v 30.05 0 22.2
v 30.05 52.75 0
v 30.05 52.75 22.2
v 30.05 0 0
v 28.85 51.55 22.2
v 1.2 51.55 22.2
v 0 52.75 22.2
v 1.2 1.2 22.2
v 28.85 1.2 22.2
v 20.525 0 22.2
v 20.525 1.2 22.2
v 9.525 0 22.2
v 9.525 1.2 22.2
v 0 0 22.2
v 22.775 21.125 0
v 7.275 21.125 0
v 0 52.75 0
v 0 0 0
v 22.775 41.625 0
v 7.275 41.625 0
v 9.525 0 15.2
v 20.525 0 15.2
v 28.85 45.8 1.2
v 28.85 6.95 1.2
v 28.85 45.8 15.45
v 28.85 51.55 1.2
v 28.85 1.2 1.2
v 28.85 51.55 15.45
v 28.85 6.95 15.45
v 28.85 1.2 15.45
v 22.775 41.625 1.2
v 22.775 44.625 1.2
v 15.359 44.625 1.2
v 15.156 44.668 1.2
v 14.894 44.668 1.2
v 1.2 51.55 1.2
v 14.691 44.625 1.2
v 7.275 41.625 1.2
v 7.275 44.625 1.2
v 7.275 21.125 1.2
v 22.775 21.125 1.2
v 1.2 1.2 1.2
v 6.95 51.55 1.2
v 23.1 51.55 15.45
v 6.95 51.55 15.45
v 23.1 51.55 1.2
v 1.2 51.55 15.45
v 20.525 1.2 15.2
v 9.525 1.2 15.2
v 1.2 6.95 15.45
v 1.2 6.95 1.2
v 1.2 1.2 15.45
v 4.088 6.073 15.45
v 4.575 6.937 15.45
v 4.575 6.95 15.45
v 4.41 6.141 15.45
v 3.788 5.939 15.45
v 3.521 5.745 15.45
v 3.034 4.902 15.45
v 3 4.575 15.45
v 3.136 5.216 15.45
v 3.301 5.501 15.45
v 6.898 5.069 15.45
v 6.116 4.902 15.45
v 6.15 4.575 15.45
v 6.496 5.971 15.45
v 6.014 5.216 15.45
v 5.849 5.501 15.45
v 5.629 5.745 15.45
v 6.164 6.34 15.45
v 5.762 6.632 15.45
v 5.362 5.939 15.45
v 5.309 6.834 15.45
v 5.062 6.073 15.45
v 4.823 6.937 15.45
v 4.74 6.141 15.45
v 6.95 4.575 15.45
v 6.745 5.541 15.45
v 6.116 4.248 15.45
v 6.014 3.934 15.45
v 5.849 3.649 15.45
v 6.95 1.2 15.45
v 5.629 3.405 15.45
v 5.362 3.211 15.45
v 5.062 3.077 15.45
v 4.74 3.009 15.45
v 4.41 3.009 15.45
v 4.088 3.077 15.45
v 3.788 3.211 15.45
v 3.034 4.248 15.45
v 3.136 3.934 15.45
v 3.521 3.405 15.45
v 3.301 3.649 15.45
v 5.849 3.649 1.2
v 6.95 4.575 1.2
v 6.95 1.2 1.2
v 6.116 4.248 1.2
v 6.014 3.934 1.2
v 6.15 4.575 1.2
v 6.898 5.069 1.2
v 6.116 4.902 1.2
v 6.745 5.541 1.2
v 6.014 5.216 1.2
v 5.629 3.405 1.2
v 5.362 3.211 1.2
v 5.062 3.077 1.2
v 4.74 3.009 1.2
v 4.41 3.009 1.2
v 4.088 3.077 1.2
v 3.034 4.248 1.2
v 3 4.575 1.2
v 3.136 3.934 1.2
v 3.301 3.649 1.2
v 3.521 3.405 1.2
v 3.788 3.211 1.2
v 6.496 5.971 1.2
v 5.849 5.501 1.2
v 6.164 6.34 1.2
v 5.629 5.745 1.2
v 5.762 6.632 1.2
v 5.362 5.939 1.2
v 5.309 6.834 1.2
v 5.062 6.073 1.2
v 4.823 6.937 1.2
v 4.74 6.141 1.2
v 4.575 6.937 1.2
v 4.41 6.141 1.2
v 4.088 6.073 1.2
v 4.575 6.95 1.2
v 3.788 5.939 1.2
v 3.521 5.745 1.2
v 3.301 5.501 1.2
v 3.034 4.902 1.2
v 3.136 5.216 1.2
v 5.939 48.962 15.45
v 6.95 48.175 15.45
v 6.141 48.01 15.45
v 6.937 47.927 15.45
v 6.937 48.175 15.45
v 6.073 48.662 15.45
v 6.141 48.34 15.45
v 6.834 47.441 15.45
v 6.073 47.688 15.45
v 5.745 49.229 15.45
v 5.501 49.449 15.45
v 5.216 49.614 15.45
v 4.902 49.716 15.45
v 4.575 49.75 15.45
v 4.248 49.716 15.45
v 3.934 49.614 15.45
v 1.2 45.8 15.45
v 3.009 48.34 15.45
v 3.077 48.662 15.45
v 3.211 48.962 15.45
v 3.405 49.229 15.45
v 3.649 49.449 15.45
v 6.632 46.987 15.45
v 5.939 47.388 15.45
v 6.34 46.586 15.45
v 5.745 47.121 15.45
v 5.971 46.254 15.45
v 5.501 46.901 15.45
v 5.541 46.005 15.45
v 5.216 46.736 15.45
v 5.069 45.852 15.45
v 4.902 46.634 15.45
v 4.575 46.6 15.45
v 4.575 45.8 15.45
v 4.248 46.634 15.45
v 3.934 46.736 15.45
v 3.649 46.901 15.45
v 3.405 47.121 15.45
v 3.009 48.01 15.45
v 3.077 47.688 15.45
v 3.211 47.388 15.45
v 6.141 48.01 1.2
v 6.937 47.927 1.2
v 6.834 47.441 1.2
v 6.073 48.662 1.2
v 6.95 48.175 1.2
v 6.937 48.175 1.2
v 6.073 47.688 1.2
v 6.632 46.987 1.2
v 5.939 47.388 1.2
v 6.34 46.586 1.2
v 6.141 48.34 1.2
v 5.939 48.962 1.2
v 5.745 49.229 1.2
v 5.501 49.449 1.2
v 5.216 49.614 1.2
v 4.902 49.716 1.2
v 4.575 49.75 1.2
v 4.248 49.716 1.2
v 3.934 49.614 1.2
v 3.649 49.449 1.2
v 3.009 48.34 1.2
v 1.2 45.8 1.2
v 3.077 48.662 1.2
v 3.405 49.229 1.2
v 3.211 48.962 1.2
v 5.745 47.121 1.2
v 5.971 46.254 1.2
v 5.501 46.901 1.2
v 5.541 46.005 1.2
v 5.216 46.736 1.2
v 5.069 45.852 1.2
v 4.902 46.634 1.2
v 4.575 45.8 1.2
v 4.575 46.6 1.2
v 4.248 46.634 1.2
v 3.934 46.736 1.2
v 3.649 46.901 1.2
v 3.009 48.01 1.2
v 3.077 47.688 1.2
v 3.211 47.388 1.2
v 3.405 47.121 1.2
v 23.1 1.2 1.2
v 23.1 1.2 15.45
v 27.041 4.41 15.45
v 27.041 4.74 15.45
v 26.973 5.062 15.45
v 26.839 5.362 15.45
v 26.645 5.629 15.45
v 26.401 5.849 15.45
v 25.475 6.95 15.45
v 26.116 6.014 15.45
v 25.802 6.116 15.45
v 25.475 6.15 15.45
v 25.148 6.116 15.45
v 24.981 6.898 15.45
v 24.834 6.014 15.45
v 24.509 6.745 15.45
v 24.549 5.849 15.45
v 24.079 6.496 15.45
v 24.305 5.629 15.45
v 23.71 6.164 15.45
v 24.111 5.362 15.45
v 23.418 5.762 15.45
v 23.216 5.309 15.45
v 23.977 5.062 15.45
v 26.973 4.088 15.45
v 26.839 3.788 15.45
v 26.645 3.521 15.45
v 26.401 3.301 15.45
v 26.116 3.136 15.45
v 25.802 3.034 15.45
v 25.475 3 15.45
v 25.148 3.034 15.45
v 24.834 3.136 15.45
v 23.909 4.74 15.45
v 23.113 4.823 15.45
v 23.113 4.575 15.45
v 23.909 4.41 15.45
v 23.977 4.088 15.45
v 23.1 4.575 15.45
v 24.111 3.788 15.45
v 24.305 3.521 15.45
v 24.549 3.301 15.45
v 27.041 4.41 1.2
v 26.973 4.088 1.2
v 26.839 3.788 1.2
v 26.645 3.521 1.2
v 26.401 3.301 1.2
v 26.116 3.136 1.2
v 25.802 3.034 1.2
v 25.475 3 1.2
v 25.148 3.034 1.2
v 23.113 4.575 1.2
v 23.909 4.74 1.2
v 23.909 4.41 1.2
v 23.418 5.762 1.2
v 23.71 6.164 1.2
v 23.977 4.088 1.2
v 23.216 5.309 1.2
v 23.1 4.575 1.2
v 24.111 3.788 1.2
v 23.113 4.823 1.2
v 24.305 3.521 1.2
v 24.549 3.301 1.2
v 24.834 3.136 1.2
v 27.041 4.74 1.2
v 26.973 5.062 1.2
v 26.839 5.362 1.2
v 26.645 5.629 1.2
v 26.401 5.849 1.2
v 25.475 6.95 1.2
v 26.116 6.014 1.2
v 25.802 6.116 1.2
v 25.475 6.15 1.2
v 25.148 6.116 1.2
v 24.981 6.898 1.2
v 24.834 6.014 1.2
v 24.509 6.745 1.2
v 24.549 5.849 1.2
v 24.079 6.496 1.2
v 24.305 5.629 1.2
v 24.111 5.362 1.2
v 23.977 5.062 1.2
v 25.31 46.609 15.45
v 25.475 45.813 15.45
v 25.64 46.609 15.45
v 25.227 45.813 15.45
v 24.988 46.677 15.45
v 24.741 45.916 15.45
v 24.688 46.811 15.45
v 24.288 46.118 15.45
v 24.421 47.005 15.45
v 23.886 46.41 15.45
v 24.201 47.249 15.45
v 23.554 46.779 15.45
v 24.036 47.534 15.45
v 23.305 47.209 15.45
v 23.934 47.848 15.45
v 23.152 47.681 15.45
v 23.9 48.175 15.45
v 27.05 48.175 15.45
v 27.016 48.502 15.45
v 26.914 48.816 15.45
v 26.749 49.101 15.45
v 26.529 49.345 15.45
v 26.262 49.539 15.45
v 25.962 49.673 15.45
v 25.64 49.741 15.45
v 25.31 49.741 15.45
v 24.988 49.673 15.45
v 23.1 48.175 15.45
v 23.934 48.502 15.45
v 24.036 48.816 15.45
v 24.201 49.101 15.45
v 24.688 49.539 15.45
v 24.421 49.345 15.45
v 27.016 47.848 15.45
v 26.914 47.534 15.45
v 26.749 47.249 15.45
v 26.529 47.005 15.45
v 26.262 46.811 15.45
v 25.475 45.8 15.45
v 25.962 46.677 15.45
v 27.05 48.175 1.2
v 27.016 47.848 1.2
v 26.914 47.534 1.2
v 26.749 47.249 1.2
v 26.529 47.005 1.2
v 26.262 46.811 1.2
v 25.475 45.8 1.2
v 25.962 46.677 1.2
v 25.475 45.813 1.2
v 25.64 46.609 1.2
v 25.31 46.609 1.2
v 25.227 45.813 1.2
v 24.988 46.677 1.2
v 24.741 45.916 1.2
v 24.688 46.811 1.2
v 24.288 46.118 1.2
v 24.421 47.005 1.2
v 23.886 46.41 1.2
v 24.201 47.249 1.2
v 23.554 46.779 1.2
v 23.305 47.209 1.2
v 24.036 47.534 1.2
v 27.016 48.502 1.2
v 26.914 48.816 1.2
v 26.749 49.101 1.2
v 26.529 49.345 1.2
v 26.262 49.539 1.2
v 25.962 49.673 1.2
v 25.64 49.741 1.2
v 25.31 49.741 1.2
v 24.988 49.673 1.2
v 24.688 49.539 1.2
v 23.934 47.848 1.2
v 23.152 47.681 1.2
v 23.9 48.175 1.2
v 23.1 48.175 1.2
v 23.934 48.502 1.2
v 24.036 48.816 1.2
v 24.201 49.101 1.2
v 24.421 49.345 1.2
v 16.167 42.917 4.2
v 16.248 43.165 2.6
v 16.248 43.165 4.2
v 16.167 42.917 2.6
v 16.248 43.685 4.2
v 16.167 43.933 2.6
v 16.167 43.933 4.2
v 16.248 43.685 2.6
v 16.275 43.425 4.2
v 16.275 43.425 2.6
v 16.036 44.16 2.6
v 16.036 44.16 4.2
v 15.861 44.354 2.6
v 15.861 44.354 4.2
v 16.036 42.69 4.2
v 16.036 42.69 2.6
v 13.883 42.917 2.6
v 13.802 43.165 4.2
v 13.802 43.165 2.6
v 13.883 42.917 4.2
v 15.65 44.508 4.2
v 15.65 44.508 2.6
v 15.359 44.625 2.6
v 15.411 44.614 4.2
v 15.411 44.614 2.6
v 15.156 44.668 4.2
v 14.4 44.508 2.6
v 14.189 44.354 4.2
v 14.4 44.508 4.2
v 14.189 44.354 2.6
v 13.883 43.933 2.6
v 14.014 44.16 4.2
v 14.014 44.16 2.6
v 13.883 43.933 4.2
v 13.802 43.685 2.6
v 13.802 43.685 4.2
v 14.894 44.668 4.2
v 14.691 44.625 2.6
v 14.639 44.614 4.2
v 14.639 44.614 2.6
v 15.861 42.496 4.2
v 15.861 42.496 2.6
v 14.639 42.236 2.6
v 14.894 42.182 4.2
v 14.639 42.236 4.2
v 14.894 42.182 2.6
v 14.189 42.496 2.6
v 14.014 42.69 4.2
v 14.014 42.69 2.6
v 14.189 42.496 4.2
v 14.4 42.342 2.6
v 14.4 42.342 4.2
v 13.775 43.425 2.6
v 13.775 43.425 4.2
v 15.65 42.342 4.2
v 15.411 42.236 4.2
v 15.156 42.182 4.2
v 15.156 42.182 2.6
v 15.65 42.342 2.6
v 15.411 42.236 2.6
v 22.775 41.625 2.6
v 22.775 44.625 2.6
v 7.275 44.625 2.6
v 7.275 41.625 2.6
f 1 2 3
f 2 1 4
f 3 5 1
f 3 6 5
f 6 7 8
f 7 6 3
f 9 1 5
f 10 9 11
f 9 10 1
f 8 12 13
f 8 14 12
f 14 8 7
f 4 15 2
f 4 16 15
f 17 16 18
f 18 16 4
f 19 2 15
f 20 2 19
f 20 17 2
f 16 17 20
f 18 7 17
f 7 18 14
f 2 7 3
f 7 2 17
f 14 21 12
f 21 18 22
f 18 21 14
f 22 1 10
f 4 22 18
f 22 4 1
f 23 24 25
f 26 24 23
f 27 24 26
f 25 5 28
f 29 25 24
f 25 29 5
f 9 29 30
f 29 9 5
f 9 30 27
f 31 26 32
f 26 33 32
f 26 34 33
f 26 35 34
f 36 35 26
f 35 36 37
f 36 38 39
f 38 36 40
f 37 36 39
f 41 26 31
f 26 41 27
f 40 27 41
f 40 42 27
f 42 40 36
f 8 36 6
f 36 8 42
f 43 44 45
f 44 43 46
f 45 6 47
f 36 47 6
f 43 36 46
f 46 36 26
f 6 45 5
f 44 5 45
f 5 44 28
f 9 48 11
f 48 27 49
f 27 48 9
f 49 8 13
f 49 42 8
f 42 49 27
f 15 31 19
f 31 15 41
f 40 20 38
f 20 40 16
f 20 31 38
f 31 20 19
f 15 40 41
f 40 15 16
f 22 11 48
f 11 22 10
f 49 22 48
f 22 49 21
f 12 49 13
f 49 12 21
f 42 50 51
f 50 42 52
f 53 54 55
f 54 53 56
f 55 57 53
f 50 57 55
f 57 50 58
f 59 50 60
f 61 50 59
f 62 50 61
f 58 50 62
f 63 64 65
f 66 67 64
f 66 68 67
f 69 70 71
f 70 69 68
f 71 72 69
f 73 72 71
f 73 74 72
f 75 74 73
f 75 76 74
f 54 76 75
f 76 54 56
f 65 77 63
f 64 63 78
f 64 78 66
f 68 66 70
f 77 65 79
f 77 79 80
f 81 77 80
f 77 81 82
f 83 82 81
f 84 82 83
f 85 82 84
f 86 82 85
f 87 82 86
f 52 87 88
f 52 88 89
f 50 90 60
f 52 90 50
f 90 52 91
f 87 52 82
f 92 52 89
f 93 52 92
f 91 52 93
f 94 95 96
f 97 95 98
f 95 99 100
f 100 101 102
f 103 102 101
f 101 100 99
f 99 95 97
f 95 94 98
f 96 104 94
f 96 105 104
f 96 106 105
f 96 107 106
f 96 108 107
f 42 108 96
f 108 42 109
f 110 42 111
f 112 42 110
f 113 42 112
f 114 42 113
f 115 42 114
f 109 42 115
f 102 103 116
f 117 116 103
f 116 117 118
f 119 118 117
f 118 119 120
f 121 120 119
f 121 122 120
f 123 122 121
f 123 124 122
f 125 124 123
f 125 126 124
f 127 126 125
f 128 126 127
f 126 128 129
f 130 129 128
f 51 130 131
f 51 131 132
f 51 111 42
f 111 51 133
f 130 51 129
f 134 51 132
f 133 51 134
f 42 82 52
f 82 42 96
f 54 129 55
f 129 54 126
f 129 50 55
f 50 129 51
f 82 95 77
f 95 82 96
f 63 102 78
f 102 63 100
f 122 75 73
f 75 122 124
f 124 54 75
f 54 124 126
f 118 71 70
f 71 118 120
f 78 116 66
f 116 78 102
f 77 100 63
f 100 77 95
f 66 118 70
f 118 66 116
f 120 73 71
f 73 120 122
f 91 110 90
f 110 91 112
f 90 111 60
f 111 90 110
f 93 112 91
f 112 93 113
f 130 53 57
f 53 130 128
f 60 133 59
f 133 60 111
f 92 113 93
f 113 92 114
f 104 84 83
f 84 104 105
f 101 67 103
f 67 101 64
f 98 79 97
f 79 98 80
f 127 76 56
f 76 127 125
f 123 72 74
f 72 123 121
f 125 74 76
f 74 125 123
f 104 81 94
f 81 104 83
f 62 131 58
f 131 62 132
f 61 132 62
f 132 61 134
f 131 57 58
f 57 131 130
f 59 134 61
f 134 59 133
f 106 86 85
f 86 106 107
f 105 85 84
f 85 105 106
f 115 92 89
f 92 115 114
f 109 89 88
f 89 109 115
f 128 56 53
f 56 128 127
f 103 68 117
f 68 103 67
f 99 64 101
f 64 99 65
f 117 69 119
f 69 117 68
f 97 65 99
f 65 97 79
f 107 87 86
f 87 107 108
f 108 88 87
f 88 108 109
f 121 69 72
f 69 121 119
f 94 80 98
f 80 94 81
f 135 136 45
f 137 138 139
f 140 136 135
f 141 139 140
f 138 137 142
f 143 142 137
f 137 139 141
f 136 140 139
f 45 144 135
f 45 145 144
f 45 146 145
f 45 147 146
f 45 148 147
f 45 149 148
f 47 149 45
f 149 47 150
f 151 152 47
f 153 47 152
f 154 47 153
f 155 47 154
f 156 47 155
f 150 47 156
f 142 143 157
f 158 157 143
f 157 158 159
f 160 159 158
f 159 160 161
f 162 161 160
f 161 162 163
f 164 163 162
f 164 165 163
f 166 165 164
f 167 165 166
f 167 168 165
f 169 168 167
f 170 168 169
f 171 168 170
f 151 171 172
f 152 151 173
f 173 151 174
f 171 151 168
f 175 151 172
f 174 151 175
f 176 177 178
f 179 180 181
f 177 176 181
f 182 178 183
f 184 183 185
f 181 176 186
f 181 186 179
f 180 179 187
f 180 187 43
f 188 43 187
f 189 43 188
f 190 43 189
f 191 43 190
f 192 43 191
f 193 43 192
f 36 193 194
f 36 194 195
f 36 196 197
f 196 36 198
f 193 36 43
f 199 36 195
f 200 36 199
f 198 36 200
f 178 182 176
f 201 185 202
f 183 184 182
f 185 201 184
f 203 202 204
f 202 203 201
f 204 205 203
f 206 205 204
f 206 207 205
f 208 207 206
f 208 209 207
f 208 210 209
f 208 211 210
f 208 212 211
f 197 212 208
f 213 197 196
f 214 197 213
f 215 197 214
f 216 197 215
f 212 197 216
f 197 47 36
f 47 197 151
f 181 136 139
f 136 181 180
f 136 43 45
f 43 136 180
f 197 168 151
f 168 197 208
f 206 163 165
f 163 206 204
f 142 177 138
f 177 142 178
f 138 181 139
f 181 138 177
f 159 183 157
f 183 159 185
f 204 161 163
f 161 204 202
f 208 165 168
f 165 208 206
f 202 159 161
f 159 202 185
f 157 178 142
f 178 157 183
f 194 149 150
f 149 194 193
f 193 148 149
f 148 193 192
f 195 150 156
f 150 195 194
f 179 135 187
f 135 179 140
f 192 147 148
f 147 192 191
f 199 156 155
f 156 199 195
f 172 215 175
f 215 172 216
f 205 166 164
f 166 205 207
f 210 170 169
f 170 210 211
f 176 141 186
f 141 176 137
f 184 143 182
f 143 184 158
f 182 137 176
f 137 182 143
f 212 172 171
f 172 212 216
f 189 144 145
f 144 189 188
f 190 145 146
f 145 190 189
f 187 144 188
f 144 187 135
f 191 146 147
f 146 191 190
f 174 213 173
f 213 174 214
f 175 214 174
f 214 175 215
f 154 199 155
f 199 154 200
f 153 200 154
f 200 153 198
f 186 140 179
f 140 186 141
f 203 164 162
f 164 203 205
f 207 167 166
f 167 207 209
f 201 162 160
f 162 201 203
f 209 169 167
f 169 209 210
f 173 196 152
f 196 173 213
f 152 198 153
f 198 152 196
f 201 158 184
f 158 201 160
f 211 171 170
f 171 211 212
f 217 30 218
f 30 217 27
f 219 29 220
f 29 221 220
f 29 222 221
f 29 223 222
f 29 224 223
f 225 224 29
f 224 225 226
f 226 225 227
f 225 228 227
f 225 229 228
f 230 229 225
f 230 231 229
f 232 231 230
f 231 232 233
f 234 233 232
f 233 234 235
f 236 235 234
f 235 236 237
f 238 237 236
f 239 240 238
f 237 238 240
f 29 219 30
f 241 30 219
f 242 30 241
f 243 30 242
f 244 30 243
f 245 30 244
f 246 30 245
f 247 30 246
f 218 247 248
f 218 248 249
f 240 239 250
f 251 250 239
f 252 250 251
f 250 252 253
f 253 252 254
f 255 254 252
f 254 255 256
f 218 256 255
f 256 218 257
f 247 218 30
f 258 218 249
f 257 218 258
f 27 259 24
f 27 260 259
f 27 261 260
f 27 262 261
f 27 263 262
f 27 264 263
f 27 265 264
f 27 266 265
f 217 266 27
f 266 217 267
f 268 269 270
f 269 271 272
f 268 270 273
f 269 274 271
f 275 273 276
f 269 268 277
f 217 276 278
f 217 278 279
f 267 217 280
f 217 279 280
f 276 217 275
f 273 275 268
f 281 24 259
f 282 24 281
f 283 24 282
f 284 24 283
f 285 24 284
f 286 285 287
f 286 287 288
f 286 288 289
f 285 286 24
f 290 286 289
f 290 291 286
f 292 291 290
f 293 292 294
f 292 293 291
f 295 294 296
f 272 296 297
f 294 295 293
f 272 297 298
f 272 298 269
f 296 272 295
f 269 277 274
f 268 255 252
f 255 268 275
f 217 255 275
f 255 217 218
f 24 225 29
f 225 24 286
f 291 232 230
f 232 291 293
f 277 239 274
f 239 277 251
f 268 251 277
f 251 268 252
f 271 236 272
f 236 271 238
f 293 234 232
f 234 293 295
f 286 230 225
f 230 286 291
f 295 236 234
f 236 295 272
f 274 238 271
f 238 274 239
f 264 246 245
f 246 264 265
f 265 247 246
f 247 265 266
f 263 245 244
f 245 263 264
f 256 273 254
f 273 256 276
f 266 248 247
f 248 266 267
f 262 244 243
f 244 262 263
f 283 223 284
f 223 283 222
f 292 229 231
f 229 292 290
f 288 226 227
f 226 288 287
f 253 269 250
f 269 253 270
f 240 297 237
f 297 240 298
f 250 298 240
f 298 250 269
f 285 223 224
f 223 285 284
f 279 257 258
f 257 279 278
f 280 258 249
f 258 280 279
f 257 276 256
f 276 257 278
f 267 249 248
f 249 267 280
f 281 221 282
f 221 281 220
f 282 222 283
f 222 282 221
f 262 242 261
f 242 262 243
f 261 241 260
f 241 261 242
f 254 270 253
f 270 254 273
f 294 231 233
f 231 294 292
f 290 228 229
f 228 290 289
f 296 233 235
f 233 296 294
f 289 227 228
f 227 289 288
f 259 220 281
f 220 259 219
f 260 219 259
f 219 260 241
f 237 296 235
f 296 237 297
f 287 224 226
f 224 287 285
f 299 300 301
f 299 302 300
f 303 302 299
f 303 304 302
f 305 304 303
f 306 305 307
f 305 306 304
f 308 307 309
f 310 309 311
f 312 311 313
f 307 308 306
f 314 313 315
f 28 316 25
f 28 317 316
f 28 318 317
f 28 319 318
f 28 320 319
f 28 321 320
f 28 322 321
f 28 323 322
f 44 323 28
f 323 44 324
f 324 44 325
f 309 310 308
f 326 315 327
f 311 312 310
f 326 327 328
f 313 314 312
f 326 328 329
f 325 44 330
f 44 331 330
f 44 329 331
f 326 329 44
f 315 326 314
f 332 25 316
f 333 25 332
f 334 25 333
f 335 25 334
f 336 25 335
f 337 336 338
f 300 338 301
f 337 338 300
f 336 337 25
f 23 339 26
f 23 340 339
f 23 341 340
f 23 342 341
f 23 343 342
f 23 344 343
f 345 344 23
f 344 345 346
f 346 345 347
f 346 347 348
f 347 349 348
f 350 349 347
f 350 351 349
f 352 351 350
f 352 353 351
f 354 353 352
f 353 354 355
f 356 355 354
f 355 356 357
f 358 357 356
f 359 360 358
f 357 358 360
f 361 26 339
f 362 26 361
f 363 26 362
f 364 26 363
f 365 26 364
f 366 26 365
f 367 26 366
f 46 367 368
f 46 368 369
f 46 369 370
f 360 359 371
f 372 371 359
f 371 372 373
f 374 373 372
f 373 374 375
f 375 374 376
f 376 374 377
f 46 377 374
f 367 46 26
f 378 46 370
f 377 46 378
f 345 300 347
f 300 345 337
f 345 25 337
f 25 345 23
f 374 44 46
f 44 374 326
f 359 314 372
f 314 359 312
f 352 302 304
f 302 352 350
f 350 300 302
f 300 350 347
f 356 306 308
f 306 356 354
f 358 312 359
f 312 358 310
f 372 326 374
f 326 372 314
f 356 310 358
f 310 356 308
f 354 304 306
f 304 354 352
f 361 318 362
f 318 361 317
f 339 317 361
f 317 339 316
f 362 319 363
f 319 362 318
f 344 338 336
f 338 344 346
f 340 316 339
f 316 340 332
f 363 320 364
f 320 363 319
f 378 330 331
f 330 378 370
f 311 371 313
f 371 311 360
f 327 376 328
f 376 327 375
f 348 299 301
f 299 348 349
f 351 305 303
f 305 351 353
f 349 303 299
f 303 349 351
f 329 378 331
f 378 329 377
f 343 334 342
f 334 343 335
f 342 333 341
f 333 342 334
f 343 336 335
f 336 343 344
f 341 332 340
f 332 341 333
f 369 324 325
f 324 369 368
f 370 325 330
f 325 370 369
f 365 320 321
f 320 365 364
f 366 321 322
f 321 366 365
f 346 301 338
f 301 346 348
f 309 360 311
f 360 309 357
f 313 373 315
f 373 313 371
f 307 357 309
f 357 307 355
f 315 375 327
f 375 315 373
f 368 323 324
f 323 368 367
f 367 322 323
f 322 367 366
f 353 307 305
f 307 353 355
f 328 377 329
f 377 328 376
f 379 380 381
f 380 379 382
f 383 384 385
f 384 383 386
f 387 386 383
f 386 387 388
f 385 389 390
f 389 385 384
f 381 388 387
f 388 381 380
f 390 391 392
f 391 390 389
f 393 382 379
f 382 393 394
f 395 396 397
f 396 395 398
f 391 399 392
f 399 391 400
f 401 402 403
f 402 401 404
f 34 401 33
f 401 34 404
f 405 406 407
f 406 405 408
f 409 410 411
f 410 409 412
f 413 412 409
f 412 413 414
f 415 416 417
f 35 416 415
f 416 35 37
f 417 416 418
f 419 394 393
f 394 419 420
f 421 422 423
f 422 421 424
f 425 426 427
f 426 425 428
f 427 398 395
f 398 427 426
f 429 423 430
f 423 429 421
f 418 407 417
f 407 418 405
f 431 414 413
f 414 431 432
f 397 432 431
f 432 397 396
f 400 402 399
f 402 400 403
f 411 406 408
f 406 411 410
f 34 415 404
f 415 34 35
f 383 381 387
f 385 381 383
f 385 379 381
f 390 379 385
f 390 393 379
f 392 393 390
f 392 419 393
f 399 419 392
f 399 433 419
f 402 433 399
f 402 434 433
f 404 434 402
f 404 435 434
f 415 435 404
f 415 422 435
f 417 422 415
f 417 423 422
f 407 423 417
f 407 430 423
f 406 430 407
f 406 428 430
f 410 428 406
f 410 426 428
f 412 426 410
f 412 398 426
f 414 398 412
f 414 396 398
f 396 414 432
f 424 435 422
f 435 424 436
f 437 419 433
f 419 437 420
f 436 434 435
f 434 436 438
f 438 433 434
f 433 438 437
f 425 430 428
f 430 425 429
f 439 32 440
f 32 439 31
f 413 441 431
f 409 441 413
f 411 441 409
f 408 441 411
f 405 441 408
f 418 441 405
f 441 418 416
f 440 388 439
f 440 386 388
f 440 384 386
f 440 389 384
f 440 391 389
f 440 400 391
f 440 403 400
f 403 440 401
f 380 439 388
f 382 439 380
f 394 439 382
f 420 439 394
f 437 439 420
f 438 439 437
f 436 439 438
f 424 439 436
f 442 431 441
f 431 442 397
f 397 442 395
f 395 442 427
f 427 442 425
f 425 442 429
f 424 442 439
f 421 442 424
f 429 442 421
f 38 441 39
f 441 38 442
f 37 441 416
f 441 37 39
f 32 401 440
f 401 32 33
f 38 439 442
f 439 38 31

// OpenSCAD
//------------------------------------------------
// 1 - body of the NodeMCU + DHT22 box
//
// author: Alessandro Paganelli 
// e-mail: alessandro.paganelli@gmail.com
// github: https://github.com/allep
// license: GPL-3.0-or-later
// 
// Description
// This case is designed to be used with a NodeMCU 
// Amica ESP-8266 board and a DHT22 temperature
// and humidity sensor.
//
// All sizes are expressed in mm.
//------------------------------------------------

// Set face number to a sufficiently high number.
$fn = 30;

//------------------------------------------------
// Debug mode
// Set DEBUG_MODE to 1 to simulate the actual 
// screw positions, to validate the design.
DEBUG_MODE = 0;

//------------------------------------------------
// Variables

//------------------------------------------------
// Pockets
// Let's increase a little bit pocket sizs in order 
// to allow for easier simulation.
POCKET_TOLERANCE = 0.1;

//------------------------------------------------
// Box

// Inner sizes: outer size will be increased by
// the wall thickness.
Z_LEN = 21;

WALL_THICKNESS = 1.2;
BASE_THICKNESS = 1.2;

CYLINDER_THICKNESS = 0.8;

// For M3 screws it must be 1.5 mm + 5% tolerance
CYLINDER_RADIUS = 1.575;

// tolerances
CYLINDER_GAP = 1.0;

//------------------------------------------------
// Board size
BOARD_THICKNESS = 2.0;
BOARD_HEIGHT = 6.75; // including clearence

// Based on NodeMCU Amica ESP-8266 board.
SCREW_DISTANCE_Y = 43.6;
SCREW_DISTANCE_X = 20.9;

// Usb size
// Note: to be quite sure that any USB cable can fit
// here we create a hole quite large (height > 
// BOARD_HEIGHT)
// Adjust it based on your needs.
Z_USB_PORT_HEIGHT = 7;
X_USB_PORT_LEN = 11;

//------------------------------------------------
// DHT22

X_SENSOR_LEN = 15;
Y_SENSOR_LEN = 20;
X_SENSOR_GAP = 0.25;
Y_SENSOR_GAP = 0.25;

// Used to keep track of the pins that need some
// clearance to allow cables to be connected.
Y_SENSOR_DISPLACEMENT = 5;

// Peg
SENSOR_PEG_RADIUS = 1.25;
Y_SENSOR_PEG_DISTANCE = 1.8;
Z_SENSOR_PEG_HEIGHT = 3.0;
Y_SENSOR_STEP_LEN = 3;
Z_SENSOR_STEP_HEIGHT = 1.4;

//------------------------------------------------
// Screw sizes (M3)

SCREW_RADIUS = 1.5;
Z_SCREW_LEN = 30; // used just for simulation
Z_SCREW_HEAD_LEN = 4.0;

//------------------------------------------------
// Modules

module corner(radius, height, thickness, gap, position, plane_rotation) {
    ext_r = radius + thickness;
    
    translate(position)
    rotate([0, 0, plane_rotation])
    difference() {
        union() {
            cube([ext_r + gap, ext_r + gap, height]);
            translate([0, - ext_r, 0])
            cube([ext_r + gap, ext_r, height]);
            translate([- ext_r, 0, 0])
            cube([ext_r, ext_r + gap, height]);
            cylinder(h = height, r = ext_r);
        }
        cylinder(h = height + POCKET_TOLERANCE, r = radius);
    }
}

//------------------------------------------------
// Actual script

// First compute sizes

x_len_inner = SCREW_DISTANCE_X + 2*(CYLINDER_RADIUS + CYLINDER_THICKNESS + CYLINDER_GAP);
y_len_inner = SCREW_DISTANCE_Y + 2*(CYLINDER_RADIUS + CYLINDER_THICKNESS + CYLINDER_GAP);
x_len_outer = x_len_inner + 2*WALL_THICKNESS;
y_len_outer = y_len_inner + 2*WALL_THICKNESS;

echo("Computed X len = ", x_len_outer, " and Y len = ", y_len_outer);

// actual box
difference() {
    // the box
    difference() {
        cube([x_len_outer, y_len_outer, Z_LEN + BASE_THICKNESS]);
        translate([WALL_THICKNESS, WALL_THICKNESS, BASE_THICKNESS])
        cube([x_len_inner, y_len_inner, Z_LEN + POCKET_TOLERANCE]);
    }
    // the sensor hole
    translate([x_len_outer/2 - X_SENSOR_LEN/2 - X_SENSOR_GAP, y_len_outer/2 - Y_SENSOR_LEN/2 - Y_SENSOR_GAP + Y_SENSOR_DISPLACEMENT, -POCKET_TOLERANCE])
    cube([X_SENSOR_LEN + 2*X_SENSOR_GAP, Y_SENSOR_LEN + 2*Y_SENSOR_GAP, BASE_THICKNESS + 2*POCKET_TOLERANCE]);
    // the usb port hole
    translate([x_len_outer/2 - X_USB_PORT_LEN/2, -POCKET_TOLERANCE, Z_LEN + BASE_THICKNESS - Z_USB_PORT_HEIGHT])
    cube([X_USB_PORT_LEN, WALL_THICKNESS + 2*POCKET_TOLERANCE, Z_USB_PORT_HEIGHT + POCKET_TOLERANCE]);
}

// screw holes
shift_x1 = CYLINDER_GAP + CYLINDER_THICKNESS + CYLINDER_RADIUS + WALL_THICKNESS;
shift_y1 = CYLINDER_GAP + CYLINDER_THICKNESS + CYLINDER_RADIUS + WALL_THICKNESS;
corner(CYLINDER_RADIUS, Z_LEN-BOARD_HEIGHT, CYLINDER_THICKNESS, CYLINDER_GAP, [shift_x1, shift_y1, BASE_THICKNESS], 180);

shift_x2 = CYLINDER_GAP + CYLINDER_THICKNESS + CYLINDER_RADIUS + WALL_THICKNESS;
shift_y2 = CYLINDER_GAP + CYLINDER_THICKNESS + CYLINDER_RADIUS + SCREW_DISTANCE_Y + WALL_THICKNESS;
corner(CYLINDER_RADIUS, Z_LEN-BOARD_HEIGHT, CYLINDER_THICKNESS, CYLINDER_GAP, [shift_x2, shift_y2, BASE_THICKNESS], 90);

shift_x3 = CYLINDER_GAP + CYLINDER_THICKNESS + CYLINDER_RADIUS + SCREW_DISTANCE_X + WALL_THICKNESS;
shift_y3 = CYLINDER_GAP + CYLINDER_THICKNESS + CYLINDER_RADIUS + WALL_THICKNESS;
corner(CYLINDER_RADIUS, Z_LEN-BOARD_HEIGHT, CYLINDER_THICKNESS, CYLINDER_GAP, [shift_x3, shift_y3, BASE_THICKNESS], 270);

shift_x4 = CYLINDER_GAP + CYLINDER_THICKNESS + CYLINDER_RADIUS + SCREW_DISTANCE_X + WALL_THICKNESS;
shift_y4 = CYLINDER_GAP + CYLINDER_THICKNESS + CYLINDER_RADIUS + SCREW_DISTANCE_Y + WALL_THICKNESS;
corner(CYLINDER_RADIUS, Z_LEN-BOARD_HEIGHT, CYLINDER_THICKNESS, CYLINDER_GAP, [shift_x4, shift_y4, BASE_THICKNESS], 0);

// sensor peg and step
translate([x_len_outer/2, y_len_outer/2 + Y_SENSOR_LEN/2 + Y_SENSOR_GAP + Y_SENSOR_DISPLACEMENT + Y_SENSOR_PEG_DISTANCE, BASE_THICKNESS])
cylinder(h = Z_SENSOR_PEG_HEIGHT, r = SENSOR_PEG_RADIUS);
translate([x_len_outer/2 - X_SENSOR_LEN/2 - X_SENSOR_GAP, y_len_outer/2 + Y_SENSOR_LEN/2 + Y_SENSOR_GAP + Y_SENSOR_DISPLACEMENT, BASE_THICKNESS])
cube([X_SENSOR_LEN + 2*X_SENSOR_GAP, Y_SENSOR_STEP_LEN, Z_SENSOR_STEP_HEIGHT]);

//------------------------------------------------
// Size check
// Draw a simulated version of 4 screws in the right 
// positions, in order to validate the design.

if (DEBUG_MODE == 1) {
    screw1_x = WALL_THICKNESS + CYLINDER_GAP + CYLINDER_THICKNESS + CYLINDER_RADIUS;
    screw1_y = WALL_THICKNESS + CYLINDER_GAP + CYLINDER_THICKNESS + CYLINDER_RADIUS;
    color("red", 0.5)
    translate([screw1_x, screw1_y, 0])
    cylinder(h = Z_SCREW_LEN, r = SCREW_RADIUS);

    screw2_x = WALL_THICKNESS + CYLINDER_GAP + CYLINDER_THICKNESS + CYLINDER_RADIUS;
    screw2_y = WALL_THICKNESS + CYLINDER_GAP + CYLINDER_THICKNESS + CYLINDER_RADIUS + SCREW_DISTANCE_Y;
    color("red", 0.5)
    translate([screw2_x, screw2_y, 0])
    cylinder(h = Z_SCREW_LEN, r = SCREW_RADIUS);

    screw3_x = WALL_THICKNESS + CYLINDER_GAP + CYLINDER_THICKNESS + CYLINDER_RADIUS + SCREW_DISTANCE_X;
    screw3_y = WALL_THICKNESS + CYLINDER_GAP + CYLINDER_THICKNESS + CYLINDER_RADIUS;
    color("red", 0.5)
    translate([screw3_x, screw3_y, 0])
    cylinder(h = Z_SCREW_LEN, r = SCREW_RADIUS);

    screw4_x = WALL_THICKNESS + CYLINDER_GAP + CYLINDER_THICKNESS + CYLINDER_RADIUS + SCREW_DISTANCE_X;
    screw4_y = WALL_THICKNESS + CYLINDER_GAP + CYLINDER_THICKNESS + CYLINDER_RADIUS + SCREW_DISTANCE_Y;
    color("red", 0.5)
    translate([screw4_x, screw4_y, 0])
    cylinder(h = Z_SCREW_LEN, r = SCREW_RADIUS);
}
